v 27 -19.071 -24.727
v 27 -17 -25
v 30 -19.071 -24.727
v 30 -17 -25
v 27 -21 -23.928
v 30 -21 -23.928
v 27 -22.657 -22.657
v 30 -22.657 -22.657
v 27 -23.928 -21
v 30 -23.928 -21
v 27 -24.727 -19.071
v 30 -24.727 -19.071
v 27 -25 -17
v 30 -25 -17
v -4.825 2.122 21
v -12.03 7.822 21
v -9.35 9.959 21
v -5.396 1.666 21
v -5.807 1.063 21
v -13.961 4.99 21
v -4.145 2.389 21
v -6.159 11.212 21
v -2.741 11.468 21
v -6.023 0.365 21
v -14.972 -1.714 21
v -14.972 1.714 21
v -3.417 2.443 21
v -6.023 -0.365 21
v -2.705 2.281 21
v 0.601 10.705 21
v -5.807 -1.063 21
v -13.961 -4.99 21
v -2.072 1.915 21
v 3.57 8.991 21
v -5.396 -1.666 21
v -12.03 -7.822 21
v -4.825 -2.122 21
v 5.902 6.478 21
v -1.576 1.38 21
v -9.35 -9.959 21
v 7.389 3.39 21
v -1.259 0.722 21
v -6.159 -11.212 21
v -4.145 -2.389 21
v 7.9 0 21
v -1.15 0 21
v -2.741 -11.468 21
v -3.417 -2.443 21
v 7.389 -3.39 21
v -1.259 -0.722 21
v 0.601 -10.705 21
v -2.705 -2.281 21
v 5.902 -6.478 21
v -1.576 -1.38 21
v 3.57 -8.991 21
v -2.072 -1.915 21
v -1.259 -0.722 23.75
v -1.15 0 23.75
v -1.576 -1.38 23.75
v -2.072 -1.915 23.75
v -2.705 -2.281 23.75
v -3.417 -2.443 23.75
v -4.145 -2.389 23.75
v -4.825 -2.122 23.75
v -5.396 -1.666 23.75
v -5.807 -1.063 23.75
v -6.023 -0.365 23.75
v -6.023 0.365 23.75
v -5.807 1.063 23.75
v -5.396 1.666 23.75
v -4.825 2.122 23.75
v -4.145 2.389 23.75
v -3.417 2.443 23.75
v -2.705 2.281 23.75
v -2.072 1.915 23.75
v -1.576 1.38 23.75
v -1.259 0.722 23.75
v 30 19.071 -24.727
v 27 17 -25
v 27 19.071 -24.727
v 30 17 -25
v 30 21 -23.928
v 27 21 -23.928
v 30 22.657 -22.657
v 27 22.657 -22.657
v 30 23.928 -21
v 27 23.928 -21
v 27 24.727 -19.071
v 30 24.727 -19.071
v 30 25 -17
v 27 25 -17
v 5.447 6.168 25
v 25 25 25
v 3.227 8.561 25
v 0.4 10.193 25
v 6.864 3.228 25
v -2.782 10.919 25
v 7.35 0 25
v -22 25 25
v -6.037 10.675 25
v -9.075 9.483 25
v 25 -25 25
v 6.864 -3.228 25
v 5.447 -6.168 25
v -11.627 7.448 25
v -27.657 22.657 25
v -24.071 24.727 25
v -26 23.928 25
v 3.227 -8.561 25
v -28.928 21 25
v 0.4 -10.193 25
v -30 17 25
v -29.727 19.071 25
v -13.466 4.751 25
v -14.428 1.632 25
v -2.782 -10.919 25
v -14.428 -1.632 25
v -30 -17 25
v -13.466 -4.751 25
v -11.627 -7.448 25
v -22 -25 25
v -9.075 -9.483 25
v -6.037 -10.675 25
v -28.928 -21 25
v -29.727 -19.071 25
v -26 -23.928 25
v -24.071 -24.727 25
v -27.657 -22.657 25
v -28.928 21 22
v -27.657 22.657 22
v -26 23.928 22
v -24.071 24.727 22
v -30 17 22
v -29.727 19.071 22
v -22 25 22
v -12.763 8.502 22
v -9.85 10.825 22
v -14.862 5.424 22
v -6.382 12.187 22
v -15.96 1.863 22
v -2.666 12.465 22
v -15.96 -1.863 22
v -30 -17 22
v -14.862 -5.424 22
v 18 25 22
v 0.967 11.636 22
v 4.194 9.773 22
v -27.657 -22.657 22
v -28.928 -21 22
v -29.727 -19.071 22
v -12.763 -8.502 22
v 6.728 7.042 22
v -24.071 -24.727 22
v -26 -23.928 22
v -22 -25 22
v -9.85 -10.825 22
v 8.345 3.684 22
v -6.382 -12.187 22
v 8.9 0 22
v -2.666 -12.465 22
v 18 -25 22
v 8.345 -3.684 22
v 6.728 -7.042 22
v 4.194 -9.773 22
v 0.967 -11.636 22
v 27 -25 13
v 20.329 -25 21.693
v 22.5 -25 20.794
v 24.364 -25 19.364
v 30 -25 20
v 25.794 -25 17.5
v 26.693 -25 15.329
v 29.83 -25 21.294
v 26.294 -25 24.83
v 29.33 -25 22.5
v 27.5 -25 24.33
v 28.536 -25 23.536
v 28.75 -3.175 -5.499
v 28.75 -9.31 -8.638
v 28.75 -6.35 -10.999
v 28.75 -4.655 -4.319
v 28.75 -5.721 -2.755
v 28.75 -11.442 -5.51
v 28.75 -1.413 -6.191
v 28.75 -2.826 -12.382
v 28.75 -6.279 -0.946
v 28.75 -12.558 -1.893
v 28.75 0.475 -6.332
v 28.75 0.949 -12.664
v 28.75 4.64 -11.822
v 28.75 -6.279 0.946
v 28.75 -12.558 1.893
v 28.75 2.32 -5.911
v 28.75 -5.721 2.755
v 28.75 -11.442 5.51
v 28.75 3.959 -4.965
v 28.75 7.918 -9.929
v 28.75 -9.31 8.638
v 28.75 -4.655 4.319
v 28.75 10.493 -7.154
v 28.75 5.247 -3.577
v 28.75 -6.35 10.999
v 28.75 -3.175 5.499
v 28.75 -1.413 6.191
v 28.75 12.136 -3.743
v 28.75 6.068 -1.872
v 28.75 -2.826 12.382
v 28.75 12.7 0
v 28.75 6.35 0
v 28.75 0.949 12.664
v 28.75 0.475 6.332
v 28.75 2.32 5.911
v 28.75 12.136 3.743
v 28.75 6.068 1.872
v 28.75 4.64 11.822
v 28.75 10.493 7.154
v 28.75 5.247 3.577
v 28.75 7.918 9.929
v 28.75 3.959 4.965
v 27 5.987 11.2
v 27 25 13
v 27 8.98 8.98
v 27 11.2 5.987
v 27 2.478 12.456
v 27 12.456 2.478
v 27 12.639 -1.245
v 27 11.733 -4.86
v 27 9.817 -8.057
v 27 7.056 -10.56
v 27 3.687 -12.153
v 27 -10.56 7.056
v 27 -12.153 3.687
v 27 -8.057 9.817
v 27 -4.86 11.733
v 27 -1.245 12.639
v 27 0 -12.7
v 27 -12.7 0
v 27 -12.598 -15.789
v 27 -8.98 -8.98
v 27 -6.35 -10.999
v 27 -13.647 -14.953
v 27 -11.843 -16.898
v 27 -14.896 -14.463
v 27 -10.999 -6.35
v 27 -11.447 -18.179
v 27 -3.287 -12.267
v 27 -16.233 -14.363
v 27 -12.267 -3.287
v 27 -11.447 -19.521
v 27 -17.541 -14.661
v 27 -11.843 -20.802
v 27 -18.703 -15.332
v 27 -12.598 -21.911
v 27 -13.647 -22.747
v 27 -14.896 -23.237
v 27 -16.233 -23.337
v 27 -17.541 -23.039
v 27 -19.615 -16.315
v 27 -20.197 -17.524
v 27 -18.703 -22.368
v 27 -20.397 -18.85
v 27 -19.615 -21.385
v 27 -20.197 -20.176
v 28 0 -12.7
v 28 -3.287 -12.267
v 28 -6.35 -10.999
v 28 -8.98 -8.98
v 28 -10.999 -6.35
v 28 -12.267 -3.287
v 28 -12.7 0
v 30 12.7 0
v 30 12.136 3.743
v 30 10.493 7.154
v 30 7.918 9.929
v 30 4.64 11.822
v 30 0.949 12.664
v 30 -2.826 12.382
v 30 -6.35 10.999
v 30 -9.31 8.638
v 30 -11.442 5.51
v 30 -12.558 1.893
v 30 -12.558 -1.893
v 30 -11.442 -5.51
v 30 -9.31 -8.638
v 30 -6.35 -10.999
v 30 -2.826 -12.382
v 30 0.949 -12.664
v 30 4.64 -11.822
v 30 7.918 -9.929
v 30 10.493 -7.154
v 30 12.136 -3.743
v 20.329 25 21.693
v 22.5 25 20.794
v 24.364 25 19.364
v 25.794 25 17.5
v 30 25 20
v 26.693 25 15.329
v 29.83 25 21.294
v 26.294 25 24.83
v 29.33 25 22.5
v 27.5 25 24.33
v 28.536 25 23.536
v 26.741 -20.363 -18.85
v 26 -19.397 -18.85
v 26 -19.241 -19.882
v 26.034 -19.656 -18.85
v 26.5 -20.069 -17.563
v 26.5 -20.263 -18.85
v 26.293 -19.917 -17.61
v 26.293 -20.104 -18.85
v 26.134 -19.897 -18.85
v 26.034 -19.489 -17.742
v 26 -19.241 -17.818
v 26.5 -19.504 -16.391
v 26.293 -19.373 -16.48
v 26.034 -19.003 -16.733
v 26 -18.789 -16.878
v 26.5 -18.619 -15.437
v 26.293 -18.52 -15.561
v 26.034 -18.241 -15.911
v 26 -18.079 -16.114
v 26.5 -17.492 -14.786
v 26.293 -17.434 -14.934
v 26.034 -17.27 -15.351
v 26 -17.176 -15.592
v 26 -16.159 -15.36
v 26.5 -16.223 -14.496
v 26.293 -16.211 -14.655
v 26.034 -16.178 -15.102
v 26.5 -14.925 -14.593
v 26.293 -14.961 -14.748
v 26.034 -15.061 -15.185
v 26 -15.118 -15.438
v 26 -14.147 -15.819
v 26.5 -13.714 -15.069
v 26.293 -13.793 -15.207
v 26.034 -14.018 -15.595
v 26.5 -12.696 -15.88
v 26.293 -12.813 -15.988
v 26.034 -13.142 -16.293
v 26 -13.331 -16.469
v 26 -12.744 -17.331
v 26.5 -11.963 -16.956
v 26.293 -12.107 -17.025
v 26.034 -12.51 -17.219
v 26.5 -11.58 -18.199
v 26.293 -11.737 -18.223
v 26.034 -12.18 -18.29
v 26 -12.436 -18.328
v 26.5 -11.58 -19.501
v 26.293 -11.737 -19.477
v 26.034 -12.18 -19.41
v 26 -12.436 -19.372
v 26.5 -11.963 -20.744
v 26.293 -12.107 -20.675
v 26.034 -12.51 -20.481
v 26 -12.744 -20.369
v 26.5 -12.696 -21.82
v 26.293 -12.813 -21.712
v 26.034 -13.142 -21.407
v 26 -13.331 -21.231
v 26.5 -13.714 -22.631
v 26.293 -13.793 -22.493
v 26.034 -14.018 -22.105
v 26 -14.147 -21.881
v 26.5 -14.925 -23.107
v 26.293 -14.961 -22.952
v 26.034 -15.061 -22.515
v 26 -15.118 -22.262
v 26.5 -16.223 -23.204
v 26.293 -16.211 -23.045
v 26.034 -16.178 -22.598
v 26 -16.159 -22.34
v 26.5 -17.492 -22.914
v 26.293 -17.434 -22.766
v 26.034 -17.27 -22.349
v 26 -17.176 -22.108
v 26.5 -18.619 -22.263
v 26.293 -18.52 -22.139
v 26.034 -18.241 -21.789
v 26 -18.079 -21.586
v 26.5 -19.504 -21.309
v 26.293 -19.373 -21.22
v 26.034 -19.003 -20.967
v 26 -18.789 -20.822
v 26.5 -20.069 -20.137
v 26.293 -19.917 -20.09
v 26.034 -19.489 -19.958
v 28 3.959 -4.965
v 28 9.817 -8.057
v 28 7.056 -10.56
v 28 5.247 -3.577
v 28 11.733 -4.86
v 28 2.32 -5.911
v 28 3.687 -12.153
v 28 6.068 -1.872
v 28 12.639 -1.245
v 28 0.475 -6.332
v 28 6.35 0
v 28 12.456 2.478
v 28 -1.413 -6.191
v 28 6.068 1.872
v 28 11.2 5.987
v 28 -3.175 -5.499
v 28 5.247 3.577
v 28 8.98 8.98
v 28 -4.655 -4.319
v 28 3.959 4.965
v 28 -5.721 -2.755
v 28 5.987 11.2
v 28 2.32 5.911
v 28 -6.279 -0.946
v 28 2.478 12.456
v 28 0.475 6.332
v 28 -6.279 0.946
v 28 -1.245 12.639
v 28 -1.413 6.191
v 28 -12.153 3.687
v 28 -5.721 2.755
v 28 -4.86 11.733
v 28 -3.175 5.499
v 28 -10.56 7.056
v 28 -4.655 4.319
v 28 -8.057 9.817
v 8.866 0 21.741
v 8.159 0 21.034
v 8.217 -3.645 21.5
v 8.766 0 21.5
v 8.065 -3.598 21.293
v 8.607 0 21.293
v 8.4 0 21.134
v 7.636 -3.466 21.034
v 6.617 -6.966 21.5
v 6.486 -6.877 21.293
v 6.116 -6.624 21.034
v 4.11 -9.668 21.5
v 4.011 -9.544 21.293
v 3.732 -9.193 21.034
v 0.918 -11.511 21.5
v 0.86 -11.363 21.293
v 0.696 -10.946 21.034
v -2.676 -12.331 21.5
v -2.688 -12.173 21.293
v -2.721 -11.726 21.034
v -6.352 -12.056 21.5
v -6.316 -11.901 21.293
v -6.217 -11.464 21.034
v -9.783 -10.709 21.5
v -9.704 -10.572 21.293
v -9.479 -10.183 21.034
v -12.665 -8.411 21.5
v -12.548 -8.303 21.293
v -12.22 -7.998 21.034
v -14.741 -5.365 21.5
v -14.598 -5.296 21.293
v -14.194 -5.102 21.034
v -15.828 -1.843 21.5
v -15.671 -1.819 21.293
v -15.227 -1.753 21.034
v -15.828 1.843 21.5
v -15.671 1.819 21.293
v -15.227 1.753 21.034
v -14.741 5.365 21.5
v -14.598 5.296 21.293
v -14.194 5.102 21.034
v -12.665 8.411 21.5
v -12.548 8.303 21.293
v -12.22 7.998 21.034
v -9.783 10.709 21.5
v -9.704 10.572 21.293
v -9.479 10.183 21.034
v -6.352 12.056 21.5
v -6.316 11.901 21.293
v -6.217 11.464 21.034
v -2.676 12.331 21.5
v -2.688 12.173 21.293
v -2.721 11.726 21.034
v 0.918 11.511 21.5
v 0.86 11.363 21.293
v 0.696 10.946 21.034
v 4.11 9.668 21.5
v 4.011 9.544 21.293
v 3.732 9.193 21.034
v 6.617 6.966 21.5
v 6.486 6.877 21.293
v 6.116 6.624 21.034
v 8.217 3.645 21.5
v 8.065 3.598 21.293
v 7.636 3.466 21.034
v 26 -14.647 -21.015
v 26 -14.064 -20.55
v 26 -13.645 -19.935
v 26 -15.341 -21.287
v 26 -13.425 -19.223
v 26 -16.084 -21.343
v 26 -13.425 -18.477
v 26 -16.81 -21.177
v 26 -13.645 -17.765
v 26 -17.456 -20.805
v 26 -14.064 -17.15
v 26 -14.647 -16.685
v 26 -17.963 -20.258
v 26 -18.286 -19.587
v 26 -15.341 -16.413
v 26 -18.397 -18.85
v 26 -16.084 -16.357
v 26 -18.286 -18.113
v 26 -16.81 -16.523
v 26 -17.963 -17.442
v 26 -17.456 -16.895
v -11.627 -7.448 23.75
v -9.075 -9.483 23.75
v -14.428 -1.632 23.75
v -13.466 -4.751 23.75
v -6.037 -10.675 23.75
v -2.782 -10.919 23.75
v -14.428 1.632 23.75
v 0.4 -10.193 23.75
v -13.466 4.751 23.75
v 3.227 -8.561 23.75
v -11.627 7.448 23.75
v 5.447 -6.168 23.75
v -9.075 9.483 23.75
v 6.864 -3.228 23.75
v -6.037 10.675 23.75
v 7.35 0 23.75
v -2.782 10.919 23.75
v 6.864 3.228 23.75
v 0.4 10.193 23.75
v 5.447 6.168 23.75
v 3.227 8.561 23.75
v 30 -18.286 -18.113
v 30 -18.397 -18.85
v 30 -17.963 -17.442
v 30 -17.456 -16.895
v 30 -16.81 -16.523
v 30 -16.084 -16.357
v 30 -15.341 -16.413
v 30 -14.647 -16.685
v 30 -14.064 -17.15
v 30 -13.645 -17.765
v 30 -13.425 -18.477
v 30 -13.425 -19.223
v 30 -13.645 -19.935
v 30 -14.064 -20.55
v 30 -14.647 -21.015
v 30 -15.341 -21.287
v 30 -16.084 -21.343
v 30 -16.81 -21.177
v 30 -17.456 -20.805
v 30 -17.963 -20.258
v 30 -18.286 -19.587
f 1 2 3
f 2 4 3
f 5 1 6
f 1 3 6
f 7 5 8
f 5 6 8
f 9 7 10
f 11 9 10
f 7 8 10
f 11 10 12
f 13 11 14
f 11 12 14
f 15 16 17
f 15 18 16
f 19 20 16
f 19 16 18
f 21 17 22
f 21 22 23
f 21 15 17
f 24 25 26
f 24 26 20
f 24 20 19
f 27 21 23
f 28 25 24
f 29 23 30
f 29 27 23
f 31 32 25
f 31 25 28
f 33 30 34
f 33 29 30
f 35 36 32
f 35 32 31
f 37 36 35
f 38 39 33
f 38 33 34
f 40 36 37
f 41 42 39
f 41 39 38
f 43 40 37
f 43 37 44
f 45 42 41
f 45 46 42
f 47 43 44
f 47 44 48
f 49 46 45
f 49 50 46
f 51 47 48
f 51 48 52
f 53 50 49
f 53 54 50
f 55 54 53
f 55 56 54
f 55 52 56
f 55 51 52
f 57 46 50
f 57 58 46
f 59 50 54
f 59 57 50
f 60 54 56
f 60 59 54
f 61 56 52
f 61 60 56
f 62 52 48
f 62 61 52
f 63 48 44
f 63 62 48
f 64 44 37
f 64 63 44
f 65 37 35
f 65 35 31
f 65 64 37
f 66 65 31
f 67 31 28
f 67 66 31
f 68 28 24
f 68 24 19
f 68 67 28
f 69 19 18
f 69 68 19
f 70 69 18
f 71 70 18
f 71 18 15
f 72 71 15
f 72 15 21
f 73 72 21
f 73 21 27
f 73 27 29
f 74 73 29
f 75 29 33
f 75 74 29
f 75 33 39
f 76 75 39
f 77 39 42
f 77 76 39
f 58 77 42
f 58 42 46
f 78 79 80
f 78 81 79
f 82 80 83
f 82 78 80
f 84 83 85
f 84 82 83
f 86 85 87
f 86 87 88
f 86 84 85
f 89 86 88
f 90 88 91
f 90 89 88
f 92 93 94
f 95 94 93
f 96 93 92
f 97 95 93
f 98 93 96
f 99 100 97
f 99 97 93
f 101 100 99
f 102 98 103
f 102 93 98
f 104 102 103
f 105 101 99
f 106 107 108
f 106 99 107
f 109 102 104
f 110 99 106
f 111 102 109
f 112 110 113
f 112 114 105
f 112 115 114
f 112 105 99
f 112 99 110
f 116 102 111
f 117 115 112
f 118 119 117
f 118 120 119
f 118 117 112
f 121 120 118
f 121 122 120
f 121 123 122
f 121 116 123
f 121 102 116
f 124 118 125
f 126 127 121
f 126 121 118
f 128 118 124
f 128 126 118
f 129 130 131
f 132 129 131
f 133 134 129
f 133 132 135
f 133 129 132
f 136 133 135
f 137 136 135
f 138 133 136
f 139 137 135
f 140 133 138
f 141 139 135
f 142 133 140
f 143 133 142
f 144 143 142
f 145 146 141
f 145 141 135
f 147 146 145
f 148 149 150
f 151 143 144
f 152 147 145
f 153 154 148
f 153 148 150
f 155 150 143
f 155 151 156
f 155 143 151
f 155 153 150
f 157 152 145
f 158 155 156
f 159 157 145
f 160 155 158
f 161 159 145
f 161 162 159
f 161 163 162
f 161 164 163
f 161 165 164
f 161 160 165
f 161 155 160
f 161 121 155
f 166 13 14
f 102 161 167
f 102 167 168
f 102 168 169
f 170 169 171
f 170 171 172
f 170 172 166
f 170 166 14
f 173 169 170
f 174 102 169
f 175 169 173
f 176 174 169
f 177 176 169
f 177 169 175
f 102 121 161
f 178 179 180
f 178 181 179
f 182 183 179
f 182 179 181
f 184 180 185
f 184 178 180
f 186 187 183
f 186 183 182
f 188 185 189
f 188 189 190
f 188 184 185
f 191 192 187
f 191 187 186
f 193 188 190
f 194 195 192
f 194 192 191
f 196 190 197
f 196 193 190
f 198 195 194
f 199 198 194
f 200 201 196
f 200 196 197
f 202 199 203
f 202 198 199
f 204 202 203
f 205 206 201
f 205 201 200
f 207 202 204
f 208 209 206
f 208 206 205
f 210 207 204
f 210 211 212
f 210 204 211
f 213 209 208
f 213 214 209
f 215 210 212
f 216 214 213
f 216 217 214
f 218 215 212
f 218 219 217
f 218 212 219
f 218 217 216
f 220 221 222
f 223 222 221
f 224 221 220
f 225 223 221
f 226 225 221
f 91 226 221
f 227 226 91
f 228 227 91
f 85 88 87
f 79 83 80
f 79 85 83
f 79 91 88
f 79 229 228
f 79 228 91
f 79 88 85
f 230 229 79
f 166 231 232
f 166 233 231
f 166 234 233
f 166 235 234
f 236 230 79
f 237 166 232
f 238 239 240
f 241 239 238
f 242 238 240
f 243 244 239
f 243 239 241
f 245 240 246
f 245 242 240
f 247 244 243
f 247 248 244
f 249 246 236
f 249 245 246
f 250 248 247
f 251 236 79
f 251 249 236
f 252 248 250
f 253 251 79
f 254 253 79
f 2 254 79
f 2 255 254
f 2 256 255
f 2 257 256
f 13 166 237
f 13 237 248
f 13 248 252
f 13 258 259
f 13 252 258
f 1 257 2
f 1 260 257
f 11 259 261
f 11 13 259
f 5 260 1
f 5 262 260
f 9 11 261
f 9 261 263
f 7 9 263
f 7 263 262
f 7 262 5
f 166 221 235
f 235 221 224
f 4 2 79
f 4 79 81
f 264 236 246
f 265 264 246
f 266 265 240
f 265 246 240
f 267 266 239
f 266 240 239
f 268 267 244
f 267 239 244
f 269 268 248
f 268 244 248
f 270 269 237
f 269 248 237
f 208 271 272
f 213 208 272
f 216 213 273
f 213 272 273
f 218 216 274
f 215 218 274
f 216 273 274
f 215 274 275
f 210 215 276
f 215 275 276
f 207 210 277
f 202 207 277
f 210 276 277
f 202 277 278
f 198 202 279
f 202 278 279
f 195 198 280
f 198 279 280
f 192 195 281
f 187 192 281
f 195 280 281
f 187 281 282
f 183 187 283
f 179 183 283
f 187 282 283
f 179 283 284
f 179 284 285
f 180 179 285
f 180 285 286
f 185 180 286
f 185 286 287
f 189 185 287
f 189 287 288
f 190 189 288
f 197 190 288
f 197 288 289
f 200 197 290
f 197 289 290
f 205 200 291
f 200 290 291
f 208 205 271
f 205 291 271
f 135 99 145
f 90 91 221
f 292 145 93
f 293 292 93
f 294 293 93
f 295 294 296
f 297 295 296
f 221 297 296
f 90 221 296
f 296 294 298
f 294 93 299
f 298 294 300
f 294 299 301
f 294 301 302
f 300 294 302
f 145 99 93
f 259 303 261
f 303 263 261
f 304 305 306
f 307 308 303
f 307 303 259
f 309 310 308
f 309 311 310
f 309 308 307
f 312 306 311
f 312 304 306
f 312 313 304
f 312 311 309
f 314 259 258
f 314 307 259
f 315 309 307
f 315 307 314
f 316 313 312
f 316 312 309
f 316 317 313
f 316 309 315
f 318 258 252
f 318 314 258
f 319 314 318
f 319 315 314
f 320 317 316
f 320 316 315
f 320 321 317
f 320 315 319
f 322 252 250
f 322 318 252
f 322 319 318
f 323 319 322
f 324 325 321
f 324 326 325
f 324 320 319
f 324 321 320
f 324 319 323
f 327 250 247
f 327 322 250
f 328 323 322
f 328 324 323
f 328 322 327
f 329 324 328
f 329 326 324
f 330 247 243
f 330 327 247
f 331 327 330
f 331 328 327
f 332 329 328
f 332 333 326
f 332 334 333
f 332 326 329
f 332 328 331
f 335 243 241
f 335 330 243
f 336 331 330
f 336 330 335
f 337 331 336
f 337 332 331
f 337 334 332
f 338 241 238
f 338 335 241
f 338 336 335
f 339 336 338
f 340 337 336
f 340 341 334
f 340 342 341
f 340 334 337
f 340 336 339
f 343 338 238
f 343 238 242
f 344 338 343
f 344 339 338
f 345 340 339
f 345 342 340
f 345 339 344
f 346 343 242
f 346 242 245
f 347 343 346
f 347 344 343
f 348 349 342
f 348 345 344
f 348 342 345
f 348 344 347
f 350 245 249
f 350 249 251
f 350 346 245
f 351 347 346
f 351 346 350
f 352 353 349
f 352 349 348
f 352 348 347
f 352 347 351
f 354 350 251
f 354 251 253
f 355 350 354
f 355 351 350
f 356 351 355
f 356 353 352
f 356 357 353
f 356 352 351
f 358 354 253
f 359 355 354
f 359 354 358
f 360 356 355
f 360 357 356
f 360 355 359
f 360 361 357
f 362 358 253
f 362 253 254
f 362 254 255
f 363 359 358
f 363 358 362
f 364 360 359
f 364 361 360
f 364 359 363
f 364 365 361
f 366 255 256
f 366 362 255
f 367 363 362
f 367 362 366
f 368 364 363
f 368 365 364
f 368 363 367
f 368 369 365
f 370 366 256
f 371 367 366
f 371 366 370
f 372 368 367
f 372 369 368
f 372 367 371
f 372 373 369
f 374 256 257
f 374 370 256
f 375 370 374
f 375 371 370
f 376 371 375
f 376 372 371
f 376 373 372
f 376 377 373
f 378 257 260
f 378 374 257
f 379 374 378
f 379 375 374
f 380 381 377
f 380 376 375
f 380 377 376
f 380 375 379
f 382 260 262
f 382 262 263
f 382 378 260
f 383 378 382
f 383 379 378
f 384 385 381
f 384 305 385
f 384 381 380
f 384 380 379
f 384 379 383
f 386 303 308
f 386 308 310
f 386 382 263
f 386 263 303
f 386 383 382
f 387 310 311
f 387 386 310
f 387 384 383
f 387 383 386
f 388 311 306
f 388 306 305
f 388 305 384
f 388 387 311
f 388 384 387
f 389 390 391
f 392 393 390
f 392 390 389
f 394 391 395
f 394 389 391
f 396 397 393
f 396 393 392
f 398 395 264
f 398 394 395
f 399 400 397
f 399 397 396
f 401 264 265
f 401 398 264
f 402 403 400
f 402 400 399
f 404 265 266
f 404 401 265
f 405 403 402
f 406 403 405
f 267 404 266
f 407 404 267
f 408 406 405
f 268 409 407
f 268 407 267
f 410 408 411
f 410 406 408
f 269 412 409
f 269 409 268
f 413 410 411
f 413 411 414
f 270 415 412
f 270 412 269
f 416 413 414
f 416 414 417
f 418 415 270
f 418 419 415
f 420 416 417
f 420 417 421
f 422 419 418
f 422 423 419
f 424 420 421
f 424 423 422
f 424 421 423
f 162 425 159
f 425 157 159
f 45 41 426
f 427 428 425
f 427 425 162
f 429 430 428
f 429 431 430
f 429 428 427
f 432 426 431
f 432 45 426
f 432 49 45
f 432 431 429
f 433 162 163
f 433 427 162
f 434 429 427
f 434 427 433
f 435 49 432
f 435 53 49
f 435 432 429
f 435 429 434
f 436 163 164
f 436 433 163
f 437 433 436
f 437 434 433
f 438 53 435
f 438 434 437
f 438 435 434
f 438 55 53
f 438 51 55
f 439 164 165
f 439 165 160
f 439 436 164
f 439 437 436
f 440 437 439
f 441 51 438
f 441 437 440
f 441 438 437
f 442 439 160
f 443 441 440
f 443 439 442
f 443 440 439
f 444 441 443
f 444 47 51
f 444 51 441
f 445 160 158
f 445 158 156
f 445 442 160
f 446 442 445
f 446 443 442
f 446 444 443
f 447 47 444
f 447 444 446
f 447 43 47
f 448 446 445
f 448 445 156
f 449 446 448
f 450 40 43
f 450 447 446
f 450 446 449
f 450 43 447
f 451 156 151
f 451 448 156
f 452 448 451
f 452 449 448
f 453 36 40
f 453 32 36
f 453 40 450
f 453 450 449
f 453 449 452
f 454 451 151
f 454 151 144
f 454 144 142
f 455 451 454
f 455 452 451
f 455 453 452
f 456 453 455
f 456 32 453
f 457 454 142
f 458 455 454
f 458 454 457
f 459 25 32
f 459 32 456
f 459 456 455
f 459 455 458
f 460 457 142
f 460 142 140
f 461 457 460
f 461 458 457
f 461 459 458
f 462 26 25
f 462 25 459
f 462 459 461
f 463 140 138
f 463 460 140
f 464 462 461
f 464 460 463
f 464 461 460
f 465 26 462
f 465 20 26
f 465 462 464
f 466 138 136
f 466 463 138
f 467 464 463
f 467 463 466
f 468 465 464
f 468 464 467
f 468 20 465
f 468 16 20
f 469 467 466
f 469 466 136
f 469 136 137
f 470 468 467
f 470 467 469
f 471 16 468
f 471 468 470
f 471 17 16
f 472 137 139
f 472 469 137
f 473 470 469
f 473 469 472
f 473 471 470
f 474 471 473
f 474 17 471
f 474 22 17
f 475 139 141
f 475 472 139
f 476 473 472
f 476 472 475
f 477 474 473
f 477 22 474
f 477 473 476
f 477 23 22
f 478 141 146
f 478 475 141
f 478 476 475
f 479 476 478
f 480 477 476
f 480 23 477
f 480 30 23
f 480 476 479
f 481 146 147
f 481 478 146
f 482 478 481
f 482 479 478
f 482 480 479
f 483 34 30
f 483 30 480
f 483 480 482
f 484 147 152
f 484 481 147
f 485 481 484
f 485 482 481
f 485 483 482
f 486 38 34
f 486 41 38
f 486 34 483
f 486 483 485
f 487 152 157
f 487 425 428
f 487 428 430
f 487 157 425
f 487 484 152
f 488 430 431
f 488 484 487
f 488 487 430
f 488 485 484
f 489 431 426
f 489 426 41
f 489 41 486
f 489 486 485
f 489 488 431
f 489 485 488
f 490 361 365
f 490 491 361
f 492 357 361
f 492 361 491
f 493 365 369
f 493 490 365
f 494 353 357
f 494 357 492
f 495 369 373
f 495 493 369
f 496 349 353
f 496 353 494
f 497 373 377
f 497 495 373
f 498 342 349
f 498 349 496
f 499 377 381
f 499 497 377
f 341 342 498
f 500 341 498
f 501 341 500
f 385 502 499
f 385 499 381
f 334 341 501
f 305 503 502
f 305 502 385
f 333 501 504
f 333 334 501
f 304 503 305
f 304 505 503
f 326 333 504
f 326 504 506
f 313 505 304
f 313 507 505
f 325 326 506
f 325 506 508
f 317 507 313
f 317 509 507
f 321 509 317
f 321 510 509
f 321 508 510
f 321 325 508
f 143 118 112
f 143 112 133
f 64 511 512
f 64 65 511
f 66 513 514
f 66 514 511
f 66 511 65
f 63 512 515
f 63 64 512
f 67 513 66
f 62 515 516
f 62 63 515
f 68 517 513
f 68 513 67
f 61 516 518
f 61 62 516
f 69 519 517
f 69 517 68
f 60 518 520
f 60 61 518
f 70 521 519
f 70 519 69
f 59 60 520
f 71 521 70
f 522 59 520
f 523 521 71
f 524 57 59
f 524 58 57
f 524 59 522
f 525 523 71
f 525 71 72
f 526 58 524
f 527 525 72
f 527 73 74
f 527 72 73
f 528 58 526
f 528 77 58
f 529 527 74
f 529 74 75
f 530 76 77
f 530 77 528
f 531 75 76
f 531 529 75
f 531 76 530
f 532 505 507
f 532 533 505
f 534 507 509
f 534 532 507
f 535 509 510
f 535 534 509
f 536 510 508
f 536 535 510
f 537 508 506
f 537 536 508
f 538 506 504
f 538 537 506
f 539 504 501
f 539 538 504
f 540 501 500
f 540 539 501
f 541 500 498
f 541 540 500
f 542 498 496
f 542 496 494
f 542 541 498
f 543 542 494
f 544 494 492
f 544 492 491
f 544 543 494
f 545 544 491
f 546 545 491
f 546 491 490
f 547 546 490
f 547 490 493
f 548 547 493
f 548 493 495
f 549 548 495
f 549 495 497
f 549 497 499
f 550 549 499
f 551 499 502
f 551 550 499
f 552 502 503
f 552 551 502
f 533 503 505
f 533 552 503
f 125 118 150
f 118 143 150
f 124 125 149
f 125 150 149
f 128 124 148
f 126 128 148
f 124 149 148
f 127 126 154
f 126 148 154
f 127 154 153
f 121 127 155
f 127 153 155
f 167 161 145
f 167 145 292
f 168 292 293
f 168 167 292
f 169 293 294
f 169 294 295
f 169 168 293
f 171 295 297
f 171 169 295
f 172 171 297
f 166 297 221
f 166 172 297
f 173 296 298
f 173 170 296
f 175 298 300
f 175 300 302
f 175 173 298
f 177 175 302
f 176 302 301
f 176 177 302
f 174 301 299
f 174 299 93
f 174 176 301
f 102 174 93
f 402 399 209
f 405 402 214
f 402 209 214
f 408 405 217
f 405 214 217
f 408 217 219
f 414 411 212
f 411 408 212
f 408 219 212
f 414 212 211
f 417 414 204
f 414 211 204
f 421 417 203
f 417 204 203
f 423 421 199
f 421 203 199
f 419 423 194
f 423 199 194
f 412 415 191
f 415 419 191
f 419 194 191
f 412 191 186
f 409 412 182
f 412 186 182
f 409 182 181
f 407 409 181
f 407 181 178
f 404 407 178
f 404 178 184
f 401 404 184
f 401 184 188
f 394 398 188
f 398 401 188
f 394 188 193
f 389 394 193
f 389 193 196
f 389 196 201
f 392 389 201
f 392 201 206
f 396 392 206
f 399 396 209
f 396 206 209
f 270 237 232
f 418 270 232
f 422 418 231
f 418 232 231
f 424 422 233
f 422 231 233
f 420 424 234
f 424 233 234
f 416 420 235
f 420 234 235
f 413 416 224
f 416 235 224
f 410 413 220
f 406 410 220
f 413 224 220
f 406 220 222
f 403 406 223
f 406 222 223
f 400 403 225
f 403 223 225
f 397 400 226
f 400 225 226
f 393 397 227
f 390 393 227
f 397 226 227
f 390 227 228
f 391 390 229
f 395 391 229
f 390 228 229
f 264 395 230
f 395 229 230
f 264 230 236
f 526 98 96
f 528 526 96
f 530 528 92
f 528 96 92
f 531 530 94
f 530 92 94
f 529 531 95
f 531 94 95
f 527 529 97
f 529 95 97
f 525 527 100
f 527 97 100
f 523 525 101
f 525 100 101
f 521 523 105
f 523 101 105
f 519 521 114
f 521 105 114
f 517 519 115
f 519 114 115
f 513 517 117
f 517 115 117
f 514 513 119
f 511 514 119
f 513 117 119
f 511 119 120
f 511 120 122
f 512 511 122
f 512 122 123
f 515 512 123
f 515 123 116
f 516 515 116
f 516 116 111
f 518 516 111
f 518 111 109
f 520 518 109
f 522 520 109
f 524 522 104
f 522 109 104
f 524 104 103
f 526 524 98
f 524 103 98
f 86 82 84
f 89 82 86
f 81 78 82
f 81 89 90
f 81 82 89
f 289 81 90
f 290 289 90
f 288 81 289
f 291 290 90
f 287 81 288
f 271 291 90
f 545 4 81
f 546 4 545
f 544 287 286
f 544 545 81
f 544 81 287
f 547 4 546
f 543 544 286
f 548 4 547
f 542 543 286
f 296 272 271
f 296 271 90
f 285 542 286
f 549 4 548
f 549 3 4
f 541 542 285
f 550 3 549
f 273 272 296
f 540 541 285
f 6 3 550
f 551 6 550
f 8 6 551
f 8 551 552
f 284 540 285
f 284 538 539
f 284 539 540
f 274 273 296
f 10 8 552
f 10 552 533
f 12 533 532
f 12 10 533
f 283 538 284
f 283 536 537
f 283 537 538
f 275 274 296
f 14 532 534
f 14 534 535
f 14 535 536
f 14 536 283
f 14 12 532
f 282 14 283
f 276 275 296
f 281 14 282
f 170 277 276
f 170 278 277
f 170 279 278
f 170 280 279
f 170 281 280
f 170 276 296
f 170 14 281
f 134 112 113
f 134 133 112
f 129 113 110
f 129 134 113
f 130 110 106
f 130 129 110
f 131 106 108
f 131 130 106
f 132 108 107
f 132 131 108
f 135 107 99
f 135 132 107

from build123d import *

# Parameters (mm, degrees)
F1_DEPTH  = 25
F2_R      = 8
F3_R      = 10.95
F3_R_2    = 2.45
F5_DEPTH  = 1.25
F6_DEPTH  = 3
F4_R      = 12.7
F4_R_2    = 6.35
F8_DEPTH  = 1.25
F7_R      = 6.35
F9_DEPTH  = 1
F10_DEPTH = 3
F11_R     = 5
F7_R_2    = 2.5
F12_DEPTH = 3
F7_R_3    = 4.5
F13_DEPTH = 1
F14_R     = 0.99999
F15_R     = 12.5
F15_R_2   = 2.45
F16_DEPTH = 1
F17_R     = 0.99999


# Not quite as in the source:
# - a fillet or chamfer is up to 0.001 mm smaller than in the source, because OpenCascade refuses the exact size


with BuildPart() as f1:
    # F0 (on Front) → F1 (new body, symmetric)
    with BuildSketch(Plane.XZ):
        with BuildLine():
            Line((30, -25), (30, 25))
            Line((30, 25), (-30, 25))
            Line((-30, 25), (-30, 22))
            Line((-30, 22), (18, 22))
            ThreePointArc((18, 22), (24.3639610307, 19.3639610307), (27, 13))
            Line((27, 13), (27, -25))
            Line((27, -25), (30, -25))
        make_face()
    extrude(amount=F1_DEPTH, both=True)

    # F2
    f2_edges = [f1.edges().sort_by_distance(p)[0] for p in [
        (-30, -25, 23.5),
        (-30, 25, 23.5),
        (28.5, 25, -25),
        (28.5, -25, -25),
    ]]
    fillet(f2_edges, radius=F2_R)

    # F3 (on face) → F5 (cut)
    with BuildSketch(Plane.XY.offset(25)):
        with Locations((-3.6, 0)):
            Circle(F3_R)
        with Locations((-3.6, 0)):
            Circle(F3_R_2, mode=Mode.SUBTRACT)
    extrude(amount=-F5_DEPTH, mode=Mode.SUBTRACT)

    # F6 (cut): a face of the model
    f6_faces = [f1.faces().sort_by_distance(p)[0] for p in [
        (-3.6, 0, 25),
    ]]
    extrude(f6_faces, amount=-F6_DEPTH, mode=Mode.SUBTRACT)

    # F4 (on face) → F8 (cut)
    with BuildSketch(Plane.YZ.offset(30)):
        Circle(F4_R)
        Circle(F4_R_2, mode=Mode.SUBTRACT)
    extrude(amount=-F8_DEPTH, mode=Mode.SUBTRACT)

    # F7 (on face) → F9 (cut)
    with BuildSketch(Plane(origin=(27, 0, 0), x_dir=(0, -1, 0), z_dir=(-1, 0, 0))):
        with BuildLine():
            ThreePointArc((0, -12.7), (8.9802561211, -8.9802561211), (12.7, 0))
            ThreePointArc((12.7, 0), (-8.9802561211, 8.9802561211), (0, -12.7))
        make_face()
        Circle(F7_R, mode=Mode.SUBTRACT)
    extrude(amount=-F9_DEPTH, mode=Mode.SUBTRACT)

    # F10 (cut): a face of the model
    f10_faces = [f1.faces().sort_by_distance(p)[0] for p in [
        (30, 0, 0),
    ]]
    extrude(f10_faces, amount=-F10_DEPTH, mode=Mode.SUBTRACT)

    # F11
    f11_edges = [f1.edges().sort_by_distance(p)[0] for p in [
        (30, 0, 25),
    ]]
    fillet(f11_edges, radius=F11_R)

    # F7 (on face) → F12 (cut)
    with BuildSketch(Plane(origin=(27, 0, 0), x_dir=(0, -1, 0), z_dir=(-1, 0, 0))):
        with Locations((15.8969778568, -18.85)):
            Circle(F7_R_2)
    extrude(amount=-F12_DEPTH, mode=Mode.SUBTRACT)

    # F7 (on face) → F13 (join)
    with BuildSketch(Plane(origin=(27, 0, 0), x_dir=(0, -1, 0), z_dir=(-1, 0, 0))):
        with Locations((15.8969778568, -18.85)):
            Circle(F7_R_3)
        with Locations((15.8969778568, -18.85)):
            Circle(F7_R_2, mode=Mode.SUBTRACT)
    extrude(amount=F13_DEPTH)

    # F14 (radius 1 in the source; OpenCascade refuses exactly that, so slightly less here)
    f14_edges = [f1.edges().sort_by_distance(p)[0] for p in [
        (26, -11.396978, -18.85),
    ]]
    fillet(f14_edges, radius=F14_R)

    # F15 (on face) → F16 (join)
    with BuildSketch(Plane(origin=(0, 0, 22), x_dir=(1, 0, 0), z_dir=(0, 0, -1))):
        with Locations((-3.6, 0)):
            Circle(F15_R)
        with Locations((-3.6, 0)):
            Circle(F15_R_2, mode=Mode.SUBTRACT)
    extrude(amount=F16_DEPTH)

    # F17 (radius 1 in the source; OpenCascade refuses exactly that, so slightly less here)
    f17_edges = [f1.edges().sort_by_distance(p)[0] for p in [
        (-16.1, 0, 21),
    ]]
    fillet(f17_edges, radius=F17_R)


solid = f1.part
